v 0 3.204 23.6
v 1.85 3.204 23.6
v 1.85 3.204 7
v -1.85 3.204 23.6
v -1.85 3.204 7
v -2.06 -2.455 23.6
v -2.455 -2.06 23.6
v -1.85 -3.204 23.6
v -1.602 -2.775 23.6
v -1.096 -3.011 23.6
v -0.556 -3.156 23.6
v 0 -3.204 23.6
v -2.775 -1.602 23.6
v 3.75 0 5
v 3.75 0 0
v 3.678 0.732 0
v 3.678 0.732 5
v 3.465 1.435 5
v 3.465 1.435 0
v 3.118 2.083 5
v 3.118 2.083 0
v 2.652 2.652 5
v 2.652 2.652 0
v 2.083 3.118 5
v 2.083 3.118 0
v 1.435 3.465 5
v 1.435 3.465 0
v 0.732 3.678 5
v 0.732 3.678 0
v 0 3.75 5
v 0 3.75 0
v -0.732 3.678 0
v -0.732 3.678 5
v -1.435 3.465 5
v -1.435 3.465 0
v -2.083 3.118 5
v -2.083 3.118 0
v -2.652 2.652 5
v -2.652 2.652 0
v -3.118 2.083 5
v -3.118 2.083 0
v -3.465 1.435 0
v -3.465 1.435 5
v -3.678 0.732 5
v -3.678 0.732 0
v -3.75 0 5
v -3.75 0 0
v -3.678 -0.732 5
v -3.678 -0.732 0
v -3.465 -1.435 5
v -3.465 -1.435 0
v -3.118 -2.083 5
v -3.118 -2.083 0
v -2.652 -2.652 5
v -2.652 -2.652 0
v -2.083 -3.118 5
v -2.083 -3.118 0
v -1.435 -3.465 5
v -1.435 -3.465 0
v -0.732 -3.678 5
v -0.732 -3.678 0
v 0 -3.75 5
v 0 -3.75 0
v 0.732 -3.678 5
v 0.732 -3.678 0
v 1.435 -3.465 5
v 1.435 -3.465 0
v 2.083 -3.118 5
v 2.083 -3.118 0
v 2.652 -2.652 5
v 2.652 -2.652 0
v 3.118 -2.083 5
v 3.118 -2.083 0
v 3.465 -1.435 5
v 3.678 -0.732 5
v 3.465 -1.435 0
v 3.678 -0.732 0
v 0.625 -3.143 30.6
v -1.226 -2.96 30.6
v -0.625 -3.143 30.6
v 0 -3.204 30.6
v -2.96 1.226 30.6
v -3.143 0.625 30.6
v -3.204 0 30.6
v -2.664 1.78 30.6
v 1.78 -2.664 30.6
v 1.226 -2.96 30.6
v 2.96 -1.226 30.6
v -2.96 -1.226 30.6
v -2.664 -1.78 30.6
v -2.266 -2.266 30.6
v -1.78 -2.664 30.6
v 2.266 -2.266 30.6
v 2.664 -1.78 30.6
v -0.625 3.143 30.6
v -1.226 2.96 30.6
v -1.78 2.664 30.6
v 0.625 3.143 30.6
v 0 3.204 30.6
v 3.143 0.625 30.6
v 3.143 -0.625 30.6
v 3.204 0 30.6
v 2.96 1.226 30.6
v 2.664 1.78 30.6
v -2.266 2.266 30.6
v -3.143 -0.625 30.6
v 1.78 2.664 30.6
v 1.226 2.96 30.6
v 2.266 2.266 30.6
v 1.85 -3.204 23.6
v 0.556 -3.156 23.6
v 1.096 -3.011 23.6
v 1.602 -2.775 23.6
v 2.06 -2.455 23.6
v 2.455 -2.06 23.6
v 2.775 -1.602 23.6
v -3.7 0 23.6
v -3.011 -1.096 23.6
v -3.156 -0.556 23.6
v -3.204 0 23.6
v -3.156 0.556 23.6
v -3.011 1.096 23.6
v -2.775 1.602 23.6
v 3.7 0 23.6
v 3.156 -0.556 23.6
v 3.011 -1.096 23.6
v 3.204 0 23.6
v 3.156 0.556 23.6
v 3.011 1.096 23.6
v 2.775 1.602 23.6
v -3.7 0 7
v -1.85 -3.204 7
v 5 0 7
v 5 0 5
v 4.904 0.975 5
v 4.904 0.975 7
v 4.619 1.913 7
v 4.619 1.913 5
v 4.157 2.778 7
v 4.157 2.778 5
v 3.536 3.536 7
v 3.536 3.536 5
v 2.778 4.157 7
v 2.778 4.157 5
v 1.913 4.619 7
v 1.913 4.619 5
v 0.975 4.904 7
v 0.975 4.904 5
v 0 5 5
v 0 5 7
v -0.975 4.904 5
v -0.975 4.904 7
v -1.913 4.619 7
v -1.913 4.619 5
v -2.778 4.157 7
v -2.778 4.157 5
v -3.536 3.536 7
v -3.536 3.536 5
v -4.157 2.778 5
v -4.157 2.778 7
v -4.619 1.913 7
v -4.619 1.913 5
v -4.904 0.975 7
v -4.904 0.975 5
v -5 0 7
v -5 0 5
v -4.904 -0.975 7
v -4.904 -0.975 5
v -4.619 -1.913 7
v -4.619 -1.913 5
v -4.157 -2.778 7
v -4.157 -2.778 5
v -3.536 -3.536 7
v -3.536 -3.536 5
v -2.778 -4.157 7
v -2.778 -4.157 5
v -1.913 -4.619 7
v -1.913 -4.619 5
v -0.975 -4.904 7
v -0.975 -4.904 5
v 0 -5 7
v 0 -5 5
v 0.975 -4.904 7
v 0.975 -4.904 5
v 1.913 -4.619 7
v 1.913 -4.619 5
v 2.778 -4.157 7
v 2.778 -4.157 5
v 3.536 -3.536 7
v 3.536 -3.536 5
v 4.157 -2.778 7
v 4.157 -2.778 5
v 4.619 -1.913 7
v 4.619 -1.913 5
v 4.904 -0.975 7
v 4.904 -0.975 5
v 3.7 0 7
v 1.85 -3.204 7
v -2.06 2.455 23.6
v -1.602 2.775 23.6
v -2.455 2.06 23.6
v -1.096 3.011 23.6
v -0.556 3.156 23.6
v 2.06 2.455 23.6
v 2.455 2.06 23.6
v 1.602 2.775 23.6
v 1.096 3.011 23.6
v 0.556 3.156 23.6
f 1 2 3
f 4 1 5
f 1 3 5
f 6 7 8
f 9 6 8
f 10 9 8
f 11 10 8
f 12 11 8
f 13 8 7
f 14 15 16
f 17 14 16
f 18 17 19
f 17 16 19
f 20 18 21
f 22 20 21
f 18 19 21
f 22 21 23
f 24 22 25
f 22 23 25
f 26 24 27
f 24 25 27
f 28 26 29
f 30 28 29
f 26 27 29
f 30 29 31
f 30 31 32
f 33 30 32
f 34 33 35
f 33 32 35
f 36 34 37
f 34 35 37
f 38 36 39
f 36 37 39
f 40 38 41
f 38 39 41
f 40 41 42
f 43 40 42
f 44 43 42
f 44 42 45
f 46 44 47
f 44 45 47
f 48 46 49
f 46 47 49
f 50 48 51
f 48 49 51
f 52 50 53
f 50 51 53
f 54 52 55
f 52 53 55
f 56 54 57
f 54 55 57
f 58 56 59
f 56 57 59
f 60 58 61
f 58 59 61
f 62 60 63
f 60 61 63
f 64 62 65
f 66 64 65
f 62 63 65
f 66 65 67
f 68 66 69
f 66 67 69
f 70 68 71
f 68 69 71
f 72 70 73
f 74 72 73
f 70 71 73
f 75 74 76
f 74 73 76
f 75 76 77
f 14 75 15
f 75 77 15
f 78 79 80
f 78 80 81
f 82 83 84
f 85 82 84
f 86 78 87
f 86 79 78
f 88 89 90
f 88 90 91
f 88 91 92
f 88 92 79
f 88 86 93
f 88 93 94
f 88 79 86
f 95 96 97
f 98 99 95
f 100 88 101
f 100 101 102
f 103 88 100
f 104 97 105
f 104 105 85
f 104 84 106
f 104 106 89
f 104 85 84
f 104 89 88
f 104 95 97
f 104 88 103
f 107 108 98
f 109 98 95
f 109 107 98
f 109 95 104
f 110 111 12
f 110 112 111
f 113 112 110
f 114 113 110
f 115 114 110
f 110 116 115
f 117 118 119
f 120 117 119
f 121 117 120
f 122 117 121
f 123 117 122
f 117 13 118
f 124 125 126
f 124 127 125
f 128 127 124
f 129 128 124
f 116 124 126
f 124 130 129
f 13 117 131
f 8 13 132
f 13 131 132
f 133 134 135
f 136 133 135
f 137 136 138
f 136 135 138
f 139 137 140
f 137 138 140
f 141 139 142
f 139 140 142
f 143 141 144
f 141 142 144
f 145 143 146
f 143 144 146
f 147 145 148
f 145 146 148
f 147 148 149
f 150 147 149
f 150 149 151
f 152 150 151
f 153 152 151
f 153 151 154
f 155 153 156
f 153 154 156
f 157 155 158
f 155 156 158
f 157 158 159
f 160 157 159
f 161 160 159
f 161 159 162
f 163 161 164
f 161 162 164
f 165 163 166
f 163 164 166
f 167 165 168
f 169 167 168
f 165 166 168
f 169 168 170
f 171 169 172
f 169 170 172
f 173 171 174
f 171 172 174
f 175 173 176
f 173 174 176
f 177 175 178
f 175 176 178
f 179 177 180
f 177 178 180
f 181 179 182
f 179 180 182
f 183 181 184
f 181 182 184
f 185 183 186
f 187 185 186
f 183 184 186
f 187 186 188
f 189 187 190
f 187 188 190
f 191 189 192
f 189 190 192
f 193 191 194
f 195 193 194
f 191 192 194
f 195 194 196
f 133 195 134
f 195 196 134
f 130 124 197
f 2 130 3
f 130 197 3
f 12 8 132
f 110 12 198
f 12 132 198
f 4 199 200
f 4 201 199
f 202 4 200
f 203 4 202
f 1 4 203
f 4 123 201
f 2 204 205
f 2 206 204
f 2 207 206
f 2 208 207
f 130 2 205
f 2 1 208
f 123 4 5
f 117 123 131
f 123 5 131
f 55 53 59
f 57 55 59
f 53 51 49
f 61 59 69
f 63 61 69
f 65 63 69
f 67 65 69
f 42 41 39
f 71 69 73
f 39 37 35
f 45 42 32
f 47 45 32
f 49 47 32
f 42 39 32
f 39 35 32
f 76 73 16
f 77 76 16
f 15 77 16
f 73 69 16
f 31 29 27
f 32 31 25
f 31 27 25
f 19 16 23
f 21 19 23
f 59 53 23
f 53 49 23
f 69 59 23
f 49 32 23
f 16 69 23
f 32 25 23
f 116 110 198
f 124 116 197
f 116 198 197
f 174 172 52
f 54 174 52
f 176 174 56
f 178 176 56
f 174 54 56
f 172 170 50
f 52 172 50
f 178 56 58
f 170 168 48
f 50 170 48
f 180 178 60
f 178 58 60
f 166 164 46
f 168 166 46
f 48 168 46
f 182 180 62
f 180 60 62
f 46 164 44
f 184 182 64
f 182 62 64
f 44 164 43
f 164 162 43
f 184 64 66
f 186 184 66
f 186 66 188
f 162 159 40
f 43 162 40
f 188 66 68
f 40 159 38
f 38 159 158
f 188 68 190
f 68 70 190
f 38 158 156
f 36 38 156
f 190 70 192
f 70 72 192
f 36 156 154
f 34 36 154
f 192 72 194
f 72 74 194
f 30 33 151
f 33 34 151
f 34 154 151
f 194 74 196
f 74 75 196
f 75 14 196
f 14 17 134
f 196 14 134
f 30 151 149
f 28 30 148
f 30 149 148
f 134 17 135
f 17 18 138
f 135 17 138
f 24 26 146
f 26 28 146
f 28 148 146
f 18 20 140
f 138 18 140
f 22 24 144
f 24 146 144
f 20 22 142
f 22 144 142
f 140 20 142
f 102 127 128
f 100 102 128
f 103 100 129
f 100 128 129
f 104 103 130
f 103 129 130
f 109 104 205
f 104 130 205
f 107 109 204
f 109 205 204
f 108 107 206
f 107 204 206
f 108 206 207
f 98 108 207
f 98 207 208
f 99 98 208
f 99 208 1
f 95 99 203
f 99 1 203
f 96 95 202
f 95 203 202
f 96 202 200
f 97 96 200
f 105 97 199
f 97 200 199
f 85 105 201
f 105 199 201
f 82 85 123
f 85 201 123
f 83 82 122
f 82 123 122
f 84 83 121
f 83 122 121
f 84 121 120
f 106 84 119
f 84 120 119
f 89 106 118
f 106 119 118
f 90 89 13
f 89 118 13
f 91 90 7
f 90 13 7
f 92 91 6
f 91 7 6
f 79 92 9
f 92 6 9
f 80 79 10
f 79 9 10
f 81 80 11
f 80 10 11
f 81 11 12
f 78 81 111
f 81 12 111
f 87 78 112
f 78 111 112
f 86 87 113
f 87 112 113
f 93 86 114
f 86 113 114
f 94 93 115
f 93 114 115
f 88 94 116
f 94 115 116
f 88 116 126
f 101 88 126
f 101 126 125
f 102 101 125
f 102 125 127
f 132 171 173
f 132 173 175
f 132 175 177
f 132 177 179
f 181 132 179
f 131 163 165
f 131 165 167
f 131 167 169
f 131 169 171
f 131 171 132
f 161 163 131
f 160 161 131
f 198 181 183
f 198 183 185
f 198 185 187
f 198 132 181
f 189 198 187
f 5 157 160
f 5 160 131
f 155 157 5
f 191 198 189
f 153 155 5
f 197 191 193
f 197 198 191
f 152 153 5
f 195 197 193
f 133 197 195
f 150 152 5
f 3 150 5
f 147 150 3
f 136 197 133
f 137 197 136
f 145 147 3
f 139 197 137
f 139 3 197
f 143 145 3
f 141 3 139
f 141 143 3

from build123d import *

# Parameters (mm, degrees)
SKETCH1_R           = 3.75
BOSS_EXTRUDE1_DEPTH = 5
SKETCH2_R           = 5
BOSS_EXTRUDE2_DEPTH = 2
BOSS_EXTRUDE3_DEPTH = 16.6
SKETCH4_R           = 3.204293994
BOSS_EXTRUDE4_DEPTH = 7


with BuildPart() as part:
    # Sketch1 → Boss-Extrude1 (new body)
    with BuildSketch(Plane.XY):
        Circle(SKETCH1_R)
    extrude(amount=BOSS_EXTRUDE1_DEPTH)

    # Sketch2 → Boss-Extrude2 (add)
    with BuildSketch(Plane.XY.offset(5)):
        Circle(SKETCH2_R)
    extrude(amount=BOSS_EXTRUDE2_DEPTH)

    # Sketch3 → Boss-Extrude3 (add)
    with BuildSketch(Plane.XY.offset(7)):
        Polygon((3.7, 0), (1.85, 3.204293994), (-1.85, 3.204293994), (-3.7, 0), (-1.85, -3.204293994), (1.85, -3.204293994), align=None)
    extrude(amount=BOSS_EXTRUDE3_DEPTH)

    # Sketch4 → Boss-Extrude4 (add)
    with BuildSketch(Plane.XY.offset(23.6)):
        Circle(SKETCH4_R)
    extrude(amount=BOSS_EXTRUDE4_DEPTH)


solid = part.part
